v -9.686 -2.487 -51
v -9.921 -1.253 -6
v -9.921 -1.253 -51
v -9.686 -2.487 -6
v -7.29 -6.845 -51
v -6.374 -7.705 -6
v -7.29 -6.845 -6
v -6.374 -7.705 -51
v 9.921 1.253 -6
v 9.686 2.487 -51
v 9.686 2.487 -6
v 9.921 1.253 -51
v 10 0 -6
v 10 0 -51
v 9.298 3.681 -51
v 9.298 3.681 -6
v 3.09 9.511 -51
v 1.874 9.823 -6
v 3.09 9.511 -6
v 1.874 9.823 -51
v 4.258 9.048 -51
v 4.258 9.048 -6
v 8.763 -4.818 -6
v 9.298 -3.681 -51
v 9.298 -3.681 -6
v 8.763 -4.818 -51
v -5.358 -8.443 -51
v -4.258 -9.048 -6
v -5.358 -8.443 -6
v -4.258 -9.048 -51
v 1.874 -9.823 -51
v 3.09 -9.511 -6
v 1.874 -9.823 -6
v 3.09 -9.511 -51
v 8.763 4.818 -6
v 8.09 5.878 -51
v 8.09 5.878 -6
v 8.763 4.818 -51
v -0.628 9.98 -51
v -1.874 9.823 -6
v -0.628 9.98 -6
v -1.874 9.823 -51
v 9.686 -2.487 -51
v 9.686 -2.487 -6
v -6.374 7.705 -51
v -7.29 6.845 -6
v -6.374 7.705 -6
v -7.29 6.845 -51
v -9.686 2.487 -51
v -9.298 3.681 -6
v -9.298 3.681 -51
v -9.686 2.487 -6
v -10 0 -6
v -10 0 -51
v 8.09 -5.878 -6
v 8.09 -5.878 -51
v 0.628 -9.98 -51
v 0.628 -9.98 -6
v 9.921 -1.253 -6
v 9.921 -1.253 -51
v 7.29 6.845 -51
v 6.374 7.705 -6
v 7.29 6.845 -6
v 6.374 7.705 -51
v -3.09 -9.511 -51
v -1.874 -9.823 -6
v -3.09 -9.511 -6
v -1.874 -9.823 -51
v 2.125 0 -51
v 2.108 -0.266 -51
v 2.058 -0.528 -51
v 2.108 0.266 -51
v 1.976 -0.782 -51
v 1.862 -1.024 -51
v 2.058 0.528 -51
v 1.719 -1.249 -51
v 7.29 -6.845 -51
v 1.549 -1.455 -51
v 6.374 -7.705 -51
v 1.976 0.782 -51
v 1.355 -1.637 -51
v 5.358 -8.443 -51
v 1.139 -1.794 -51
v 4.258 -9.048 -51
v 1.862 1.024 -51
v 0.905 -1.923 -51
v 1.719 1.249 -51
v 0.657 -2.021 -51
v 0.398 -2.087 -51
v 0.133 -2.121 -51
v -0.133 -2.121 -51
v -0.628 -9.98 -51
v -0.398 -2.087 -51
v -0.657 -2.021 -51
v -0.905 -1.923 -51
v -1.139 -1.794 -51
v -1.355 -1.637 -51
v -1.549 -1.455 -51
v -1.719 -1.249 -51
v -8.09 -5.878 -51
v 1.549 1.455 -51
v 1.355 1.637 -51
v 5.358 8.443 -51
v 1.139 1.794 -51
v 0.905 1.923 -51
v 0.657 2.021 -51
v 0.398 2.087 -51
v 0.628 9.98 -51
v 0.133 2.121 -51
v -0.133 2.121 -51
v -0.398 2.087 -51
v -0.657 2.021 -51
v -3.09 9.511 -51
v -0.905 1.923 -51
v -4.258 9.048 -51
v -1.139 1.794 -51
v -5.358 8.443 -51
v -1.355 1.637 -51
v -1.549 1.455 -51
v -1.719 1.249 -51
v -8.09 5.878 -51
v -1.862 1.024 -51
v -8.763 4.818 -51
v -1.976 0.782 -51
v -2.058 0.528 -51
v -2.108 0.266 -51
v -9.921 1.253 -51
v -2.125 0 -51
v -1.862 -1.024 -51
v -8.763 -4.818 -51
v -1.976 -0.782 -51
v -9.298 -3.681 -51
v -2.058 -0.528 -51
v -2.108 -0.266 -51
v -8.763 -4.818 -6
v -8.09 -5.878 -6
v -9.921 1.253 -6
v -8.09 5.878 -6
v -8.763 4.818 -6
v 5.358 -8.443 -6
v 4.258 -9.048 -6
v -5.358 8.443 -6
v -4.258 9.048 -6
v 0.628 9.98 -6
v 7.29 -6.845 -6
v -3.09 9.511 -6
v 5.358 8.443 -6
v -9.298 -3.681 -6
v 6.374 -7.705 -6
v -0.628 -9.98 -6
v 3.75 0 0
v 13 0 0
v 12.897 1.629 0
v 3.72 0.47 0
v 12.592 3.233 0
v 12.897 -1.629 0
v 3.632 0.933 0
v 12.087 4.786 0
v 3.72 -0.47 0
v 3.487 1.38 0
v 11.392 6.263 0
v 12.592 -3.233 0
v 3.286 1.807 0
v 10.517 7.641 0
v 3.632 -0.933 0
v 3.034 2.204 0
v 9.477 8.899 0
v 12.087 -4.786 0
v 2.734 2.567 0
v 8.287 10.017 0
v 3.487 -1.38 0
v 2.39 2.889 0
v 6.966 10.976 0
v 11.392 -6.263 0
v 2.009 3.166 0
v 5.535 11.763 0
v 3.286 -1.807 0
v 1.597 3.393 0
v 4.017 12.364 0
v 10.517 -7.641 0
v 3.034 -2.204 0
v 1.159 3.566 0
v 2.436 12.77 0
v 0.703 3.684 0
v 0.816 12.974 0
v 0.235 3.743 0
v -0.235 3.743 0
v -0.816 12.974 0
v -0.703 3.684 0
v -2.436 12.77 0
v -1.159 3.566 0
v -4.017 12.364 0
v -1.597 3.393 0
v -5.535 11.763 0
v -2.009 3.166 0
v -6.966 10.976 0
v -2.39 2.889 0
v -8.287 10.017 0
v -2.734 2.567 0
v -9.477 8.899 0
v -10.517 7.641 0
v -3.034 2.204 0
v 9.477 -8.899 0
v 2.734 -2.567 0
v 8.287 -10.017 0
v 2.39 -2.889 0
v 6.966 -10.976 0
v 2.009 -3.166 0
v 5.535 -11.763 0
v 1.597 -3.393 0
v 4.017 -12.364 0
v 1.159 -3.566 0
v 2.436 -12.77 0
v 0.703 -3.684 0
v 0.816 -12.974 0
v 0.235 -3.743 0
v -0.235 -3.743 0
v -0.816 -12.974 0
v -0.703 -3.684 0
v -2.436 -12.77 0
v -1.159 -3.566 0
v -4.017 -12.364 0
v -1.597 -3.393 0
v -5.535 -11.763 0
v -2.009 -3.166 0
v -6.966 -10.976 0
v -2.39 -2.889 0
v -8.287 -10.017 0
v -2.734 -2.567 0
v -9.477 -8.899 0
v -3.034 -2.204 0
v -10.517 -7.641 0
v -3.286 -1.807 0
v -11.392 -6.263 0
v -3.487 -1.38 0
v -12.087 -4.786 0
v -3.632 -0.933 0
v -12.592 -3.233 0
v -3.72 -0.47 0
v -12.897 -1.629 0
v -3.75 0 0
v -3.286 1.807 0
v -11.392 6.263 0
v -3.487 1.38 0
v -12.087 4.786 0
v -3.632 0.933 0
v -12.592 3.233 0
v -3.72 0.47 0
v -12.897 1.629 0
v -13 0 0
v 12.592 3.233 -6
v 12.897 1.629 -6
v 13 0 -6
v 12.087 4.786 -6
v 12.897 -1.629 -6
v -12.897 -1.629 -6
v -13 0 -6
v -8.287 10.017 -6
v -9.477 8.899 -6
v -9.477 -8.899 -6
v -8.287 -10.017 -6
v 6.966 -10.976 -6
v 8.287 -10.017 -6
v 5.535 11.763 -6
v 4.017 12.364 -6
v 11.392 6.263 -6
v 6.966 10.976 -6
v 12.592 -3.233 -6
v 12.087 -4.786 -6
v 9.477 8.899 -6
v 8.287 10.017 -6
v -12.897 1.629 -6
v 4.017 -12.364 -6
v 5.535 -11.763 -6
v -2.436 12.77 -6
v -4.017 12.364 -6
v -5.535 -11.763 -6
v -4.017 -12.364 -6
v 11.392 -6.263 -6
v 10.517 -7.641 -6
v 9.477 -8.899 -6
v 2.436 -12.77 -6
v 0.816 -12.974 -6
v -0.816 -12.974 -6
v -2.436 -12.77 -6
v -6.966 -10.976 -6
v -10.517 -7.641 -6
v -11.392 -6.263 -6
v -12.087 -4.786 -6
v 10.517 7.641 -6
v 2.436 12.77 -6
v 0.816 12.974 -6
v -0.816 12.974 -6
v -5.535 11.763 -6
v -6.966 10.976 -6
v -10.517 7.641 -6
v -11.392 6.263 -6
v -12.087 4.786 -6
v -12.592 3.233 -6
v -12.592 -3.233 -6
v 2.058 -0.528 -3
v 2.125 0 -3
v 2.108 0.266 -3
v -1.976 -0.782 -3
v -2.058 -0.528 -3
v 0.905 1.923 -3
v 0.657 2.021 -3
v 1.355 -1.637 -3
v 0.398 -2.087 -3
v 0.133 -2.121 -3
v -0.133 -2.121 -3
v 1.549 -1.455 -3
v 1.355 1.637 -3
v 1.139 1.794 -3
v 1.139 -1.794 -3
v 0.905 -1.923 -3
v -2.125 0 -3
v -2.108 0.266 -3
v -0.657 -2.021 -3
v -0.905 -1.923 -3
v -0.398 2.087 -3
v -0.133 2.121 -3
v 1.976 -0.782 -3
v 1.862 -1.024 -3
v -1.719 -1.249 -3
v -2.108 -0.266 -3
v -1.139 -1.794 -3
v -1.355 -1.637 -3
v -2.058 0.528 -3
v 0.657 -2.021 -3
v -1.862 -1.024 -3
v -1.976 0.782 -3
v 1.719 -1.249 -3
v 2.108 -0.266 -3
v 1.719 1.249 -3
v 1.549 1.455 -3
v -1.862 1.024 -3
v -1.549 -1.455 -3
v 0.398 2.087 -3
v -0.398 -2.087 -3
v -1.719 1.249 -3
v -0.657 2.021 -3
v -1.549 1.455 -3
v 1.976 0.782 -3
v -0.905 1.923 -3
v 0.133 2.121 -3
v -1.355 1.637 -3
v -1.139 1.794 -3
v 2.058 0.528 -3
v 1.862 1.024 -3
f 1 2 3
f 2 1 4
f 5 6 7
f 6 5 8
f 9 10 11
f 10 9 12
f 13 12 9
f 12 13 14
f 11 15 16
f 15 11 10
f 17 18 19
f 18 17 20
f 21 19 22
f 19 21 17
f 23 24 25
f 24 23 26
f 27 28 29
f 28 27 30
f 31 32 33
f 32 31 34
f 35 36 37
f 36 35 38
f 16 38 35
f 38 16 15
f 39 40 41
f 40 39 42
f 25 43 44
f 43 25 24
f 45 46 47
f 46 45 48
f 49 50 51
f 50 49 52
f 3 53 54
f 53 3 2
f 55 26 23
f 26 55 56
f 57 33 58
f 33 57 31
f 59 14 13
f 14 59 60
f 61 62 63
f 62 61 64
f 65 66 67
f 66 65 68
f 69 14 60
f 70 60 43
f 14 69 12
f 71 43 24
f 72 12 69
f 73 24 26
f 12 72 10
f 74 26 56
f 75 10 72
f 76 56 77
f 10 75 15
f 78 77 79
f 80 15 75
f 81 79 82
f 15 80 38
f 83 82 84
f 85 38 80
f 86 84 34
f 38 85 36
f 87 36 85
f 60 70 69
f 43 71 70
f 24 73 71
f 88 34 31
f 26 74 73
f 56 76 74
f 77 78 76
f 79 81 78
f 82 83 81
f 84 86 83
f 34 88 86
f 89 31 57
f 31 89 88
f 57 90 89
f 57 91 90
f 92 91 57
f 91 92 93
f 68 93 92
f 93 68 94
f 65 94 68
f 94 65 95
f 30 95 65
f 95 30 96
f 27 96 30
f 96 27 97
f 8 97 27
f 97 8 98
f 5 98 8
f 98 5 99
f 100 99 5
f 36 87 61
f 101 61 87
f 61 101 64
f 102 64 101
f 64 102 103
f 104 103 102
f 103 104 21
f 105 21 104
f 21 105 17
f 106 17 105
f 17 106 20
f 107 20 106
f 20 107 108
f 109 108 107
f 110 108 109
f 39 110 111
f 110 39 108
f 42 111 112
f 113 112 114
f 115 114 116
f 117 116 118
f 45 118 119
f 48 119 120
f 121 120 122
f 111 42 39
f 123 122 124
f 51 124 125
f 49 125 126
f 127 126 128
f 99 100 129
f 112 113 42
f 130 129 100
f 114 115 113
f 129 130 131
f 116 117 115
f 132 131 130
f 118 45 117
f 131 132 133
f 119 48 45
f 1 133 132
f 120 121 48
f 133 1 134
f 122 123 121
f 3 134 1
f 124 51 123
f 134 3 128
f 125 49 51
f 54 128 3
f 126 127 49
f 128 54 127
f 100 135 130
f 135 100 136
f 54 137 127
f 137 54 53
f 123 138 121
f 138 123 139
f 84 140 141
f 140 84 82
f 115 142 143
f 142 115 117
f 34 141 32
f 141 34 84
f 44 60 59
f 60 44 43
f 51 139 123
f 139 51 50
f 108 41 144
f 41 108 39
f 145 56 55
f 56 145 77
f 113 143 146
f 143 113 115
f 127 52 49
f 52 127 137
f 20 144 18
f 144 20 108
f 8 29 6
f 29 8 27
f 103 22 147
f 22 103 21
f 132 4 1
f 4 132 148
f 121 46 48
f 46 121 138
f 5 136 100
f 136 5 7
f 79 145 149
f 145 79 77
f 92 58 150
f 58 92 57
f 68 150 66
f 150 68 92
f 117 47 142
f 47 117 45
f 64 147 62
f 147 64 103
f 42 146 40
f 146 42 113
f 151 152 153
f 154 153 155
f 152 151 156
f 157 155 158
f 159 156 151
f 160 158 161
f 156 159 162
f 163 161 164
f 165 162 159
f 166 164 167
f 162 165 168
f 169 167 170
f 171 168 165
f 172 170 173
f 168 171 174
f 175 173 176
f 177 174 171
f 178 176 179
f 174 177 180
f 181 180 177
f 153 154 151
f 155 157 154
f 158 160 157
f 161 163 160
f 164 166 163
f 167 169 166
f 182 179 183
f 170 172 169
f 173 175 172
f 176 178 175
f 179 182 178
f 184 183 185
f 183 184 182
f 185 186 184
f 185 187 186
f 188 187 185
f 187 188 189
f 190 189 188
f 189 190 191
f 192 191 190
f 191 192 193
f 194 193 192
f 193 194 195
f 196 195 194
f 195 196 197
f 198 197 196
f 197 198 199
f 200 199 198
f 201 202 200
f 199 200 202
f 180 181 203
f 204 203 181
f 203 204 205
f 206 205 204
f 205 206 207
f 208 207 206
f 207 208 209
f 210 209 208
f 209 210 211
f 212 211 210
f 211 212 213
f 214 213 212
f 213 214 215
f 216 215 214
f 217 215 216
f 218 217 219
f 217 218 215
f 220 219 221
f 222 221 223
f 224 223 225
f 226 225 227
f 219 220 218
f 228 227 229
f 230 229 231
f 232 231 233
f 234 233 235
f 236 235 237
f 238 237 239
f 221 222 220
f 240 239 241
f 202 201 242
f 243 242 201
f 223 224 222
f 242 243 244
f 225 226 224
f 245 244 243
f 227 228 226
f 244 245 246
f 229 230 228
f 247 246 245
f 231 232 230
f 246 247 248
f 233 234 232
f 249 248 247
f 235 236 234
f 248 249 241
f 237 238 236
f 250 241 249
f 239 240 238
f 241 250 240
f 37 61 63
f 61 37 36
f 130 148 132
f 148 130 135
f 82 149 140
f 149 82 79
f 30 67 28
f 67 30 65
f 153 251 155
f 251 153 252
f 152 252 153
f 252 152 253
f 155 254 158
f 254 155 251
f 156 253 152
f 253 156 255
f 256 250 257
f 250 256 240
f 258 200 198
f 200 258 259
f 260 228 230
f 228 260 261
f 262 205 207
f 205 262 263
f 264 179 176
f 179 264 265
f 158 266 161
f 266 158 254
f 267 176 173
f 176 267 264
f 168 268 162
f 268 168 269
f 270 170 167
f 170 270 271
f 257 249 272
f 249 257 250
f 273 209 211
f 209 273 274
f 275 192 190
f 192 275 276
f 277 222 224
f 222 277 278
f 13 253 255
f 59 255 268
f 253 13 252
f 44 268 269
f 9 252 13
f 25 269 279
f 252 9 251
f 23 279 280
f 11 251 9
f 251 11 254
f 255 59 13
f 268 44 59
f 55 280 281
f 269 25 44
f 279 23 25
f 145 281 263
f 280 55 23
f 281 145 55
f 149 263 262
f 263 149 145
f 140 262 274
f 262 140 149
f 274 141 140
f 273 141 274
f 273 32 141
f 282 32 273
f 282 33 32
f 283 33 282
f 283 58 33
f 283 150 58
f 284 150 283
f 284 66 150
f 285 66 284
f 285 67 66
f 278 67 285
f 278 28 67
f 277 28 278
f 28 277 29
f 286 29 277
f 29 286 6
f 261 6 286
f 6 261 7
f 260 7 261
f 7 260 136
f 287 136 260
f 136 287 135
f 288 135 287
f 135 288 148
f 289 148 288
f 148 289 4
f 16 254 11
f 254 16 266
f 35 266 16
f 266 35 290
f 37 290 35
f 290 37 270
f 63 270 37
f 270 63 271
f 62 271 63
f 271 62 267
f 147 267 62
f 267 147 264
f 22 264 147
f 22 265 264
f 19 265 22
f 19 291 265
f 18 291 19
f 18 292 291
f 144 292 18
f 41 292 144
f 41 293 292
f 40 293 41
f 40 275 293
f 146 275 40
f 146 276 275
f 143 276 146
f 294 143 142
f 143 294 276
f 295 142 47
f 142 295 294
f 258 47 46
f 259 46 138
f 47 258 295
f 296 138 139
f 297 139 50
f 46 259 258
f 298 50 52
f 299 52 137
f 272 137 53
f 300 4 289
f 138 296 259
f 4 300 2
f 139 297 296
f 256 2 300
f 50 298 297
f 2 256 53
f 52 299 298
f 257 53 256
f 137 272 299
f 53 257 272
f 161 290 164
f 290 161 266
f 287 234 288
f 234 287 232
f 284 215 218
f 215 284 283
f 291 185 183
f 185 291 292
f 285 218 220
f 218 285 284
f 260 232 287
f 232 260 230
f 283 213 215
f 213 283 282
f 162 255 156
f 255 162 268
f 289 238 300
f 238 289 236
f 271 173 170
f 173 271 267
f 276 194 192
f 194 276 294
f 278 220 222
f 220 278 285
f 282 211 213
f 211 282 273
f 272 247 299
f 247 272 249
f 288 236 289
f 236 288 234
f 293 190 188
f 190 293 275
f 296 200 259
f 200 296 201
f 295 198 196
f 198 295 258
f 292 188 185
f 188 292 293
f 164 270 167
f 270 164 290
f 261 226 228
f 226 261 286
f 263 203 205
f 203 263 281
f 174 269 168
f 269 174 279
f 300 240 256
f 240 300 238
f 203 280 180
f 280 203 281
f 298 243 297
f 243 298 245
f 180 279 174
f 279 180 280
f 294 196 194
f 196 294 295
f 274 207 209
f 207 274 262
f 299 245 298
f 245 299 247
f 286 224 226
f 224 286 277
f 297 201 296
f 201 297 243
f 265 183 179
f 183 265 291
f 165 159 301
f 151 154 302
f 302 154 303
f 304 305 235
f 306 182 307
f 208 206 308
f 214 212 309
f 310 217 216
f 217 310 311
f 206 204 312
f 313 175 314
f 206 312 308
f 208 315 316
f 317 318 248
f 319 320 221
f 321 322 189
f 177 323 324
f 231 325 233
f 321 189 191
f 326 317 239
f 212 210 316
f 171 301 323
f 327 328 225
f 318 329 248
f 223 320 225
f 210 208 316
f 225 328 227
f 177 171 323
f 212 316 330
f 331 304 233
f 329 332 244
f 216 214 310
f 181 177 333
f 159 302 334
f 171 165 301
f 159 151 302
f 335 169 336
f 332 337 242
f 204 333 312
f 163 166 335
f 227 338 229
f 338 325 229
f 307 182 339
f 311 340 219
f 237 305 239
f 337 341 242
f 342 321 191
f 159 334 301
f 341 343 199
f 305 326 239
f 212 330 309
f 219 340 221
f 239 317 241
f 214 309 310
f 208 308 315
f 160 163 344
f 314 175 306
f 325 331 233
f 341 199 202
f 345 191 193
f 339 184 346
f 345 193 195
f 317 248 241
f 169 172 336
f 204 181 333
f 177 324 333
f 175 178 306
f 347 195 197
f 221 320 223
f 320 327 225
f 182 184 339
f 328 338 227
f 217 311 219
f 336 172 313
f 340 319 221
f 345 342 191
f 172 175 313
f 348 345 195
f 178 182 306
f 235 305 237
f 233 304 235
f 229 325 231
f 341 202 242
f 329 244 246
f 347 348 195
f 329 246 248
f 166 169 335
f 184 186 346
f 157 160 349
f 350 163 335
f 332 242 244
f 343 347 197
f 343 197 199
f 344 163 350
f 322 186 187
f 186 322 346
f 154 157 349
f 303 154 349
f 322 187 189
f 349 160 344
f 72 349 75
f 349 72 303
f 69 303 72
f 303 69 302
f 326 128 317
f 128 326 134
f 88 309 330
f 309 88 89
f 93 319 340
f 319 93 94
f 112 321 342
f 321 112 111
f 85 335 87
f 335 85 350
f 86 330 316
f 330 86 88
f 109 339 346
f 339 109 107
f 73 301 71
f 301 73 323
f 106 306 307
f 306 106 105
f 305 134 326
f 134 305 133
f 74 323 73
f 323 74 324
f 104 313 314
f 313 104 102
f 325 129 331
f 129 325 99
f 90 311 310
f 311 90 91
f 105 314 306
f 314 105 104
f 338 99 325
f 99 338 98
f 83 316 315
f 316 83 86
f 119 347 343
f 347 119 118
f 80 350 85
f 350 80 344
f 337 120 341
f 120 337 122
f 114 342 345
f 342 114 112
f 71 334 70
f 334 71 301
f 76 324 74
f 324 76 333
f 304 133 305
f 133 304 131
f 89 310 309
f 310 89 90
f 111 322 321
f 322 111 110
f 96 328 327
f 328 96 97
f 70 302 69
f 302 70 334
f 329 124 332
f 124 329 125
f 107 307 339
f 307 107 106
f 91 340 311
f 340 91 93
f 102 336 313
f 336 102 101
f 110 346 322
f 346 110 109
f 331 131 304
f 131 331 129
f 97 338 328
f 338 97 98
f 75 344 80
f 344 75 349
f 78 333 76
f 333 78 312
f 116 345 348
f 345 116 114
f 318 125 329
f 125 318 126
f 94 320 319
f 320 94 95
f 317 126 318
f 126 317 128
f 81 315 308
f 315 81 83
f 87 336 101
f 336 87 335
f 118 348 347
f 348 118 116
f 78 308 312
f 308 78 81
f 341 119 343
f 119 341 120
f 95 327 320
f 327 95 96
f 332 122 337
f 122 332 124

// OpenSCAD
$fn = 50;


difference() {
	union() {
		translate(v = [0, 0, -51.0000000000]) {
			cylinder(h = 51, r = 10.0000000000);
		}
		translate(v = [0, 0, -6.0000000000]) {
			cylinder(h = 6, r = 13.0000000000);
		}
	}
	union() {
		translate(v = [0, 0, 0]) {
			rotate(a = [0, 0, 0]) {
				difference() {
					union() {
						#translate(v = [0, 0, -51.0000000000]) {
							cylinder(h = 51, r = 2.0000000000);
						}
						#translate(v = [0, 0, -3]) {
							cylinder(h = 3, r1 = 2.1250000000, r2 = 3.7500000000);
						}
						#translate(v = [0, 0, -51.0000000000]) {
							cylinder(h = 51, r = 2.1250000000);
						}
						#translate(v = [0, 0, -51.0000000000]) {
							cylinder(h = 51, r = 2.0000000000);
						}
					}
					union();
				}
			}
		}
	}
}
